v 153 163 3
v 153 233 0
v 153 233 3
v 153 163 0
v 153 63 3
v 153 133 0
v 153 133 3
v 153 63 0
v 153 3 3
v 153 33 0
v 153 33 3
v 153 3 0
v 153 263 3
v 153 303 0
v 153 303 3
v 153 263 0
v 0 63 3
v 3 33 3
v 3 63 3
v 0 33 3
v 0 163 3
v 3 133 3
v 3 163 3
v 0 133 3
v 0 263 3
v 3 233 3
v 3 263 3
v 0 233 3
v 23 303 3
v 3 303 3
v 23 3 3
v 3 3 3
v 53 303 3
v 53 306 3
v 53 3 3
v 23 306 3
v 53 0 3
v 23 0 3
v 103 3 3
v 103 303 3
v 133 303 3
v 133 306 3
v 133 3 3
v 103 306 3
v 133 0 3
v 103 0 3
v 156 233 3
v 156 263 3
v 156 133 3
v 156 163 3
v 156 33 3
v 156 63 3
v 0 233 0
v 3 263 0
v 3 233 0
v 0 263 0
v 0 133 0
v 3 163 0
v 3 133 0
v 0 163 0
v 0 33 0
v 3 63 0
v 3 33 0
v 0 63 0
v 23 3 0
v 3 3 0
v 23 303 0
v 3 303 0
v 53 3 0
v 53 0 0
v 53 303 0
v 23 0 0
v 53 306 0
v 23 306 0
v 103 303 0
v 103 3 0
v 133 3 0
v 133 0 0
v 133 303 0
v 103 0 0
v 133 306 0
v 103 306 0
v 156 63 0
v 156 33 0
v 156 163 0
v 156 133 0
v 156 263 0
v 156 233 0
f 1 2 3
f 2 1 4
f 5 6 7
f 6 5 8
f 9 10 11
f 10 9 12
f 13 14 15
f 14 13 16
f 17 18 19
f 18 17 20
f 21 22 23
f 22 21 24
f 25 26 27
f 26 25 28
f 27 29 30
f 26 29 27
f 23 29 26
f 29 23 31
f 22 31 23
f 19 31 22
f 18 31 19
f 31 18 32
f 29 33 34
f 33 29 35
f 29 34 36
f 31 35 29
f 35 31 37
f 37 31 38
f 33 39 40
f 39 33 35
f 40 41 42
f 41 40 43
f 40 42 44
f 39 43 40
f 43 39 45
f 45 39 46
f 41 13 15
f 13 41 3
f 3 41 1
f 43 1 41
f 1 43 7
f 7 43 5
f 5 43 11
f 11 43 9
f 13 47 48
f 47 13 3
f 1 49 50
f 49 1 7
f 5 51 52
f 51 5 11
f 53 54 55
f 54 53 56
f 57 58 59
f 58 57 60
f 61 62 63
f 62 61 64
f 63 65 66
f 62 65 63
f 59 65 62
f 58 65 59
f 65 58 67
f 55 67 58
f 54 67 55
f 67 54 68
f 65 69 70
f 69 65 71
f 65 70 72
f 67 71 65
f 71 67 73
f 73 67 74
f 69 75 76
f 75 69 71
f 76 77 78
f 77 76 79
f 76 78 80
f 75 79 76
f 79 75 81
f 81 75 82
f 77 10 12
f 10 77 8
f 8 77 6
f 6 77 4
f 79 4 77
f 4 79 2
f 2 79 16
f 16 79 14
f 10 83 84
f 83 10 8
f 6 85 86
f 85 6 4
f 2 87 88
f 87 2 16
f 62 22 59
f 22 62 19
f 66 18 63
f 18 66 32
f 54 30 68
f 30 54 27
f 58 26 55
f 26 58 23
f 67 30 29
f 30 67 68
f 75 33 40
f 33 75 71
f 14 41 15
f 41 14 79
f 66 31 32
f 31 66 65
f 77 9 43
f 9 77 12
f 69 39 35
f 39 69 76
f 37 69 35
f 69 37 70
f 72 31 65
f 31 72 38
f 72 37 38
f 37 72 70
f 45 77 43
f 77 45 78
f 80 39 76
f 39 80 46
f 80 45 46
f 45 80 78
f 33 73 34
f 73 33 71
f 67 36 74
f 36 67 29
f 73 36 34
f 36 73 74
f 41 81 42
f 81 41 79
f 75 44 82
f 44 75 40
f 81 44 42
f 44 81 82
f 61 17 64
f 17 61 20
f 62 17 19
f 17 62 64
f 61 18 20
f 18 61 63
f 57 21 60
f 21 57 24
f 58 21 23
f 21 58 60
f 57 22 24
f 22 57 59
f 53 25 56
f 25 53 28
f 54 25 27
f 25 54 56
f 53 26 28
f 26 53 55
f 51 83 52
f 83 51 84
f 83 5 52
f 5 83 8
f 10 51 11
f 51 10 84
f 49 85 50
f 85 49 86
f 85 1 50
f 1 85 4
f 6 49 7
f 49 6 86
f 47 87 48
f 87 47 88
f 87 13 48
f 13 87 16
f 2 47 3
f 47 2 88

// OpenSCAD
module part01 (){
//part 1
translate([3,3,0]) cube([150,300,3]);
// front handles
translate([23,0,0])cube([30,3,3]);
translate([103,0,0])cube([30,3,3]);
// back handles
translate([23,303,0])cube([30,3,3]);
translate([103,303,0])cube([30,3,3]);
// left handles
translate([0,33,0]) cube([3,30,3]);
translate([0,133,0]) cube([3,30,3]);
translate([0,233,0]) cube([3,30,3]);
// right handles
translate([153,33,0]) cube([3,30,3]);
translate([153,133,0]) cube([3,30,3]);
translate([153,233,0]) cube([3,30,3]);
};
part01();
